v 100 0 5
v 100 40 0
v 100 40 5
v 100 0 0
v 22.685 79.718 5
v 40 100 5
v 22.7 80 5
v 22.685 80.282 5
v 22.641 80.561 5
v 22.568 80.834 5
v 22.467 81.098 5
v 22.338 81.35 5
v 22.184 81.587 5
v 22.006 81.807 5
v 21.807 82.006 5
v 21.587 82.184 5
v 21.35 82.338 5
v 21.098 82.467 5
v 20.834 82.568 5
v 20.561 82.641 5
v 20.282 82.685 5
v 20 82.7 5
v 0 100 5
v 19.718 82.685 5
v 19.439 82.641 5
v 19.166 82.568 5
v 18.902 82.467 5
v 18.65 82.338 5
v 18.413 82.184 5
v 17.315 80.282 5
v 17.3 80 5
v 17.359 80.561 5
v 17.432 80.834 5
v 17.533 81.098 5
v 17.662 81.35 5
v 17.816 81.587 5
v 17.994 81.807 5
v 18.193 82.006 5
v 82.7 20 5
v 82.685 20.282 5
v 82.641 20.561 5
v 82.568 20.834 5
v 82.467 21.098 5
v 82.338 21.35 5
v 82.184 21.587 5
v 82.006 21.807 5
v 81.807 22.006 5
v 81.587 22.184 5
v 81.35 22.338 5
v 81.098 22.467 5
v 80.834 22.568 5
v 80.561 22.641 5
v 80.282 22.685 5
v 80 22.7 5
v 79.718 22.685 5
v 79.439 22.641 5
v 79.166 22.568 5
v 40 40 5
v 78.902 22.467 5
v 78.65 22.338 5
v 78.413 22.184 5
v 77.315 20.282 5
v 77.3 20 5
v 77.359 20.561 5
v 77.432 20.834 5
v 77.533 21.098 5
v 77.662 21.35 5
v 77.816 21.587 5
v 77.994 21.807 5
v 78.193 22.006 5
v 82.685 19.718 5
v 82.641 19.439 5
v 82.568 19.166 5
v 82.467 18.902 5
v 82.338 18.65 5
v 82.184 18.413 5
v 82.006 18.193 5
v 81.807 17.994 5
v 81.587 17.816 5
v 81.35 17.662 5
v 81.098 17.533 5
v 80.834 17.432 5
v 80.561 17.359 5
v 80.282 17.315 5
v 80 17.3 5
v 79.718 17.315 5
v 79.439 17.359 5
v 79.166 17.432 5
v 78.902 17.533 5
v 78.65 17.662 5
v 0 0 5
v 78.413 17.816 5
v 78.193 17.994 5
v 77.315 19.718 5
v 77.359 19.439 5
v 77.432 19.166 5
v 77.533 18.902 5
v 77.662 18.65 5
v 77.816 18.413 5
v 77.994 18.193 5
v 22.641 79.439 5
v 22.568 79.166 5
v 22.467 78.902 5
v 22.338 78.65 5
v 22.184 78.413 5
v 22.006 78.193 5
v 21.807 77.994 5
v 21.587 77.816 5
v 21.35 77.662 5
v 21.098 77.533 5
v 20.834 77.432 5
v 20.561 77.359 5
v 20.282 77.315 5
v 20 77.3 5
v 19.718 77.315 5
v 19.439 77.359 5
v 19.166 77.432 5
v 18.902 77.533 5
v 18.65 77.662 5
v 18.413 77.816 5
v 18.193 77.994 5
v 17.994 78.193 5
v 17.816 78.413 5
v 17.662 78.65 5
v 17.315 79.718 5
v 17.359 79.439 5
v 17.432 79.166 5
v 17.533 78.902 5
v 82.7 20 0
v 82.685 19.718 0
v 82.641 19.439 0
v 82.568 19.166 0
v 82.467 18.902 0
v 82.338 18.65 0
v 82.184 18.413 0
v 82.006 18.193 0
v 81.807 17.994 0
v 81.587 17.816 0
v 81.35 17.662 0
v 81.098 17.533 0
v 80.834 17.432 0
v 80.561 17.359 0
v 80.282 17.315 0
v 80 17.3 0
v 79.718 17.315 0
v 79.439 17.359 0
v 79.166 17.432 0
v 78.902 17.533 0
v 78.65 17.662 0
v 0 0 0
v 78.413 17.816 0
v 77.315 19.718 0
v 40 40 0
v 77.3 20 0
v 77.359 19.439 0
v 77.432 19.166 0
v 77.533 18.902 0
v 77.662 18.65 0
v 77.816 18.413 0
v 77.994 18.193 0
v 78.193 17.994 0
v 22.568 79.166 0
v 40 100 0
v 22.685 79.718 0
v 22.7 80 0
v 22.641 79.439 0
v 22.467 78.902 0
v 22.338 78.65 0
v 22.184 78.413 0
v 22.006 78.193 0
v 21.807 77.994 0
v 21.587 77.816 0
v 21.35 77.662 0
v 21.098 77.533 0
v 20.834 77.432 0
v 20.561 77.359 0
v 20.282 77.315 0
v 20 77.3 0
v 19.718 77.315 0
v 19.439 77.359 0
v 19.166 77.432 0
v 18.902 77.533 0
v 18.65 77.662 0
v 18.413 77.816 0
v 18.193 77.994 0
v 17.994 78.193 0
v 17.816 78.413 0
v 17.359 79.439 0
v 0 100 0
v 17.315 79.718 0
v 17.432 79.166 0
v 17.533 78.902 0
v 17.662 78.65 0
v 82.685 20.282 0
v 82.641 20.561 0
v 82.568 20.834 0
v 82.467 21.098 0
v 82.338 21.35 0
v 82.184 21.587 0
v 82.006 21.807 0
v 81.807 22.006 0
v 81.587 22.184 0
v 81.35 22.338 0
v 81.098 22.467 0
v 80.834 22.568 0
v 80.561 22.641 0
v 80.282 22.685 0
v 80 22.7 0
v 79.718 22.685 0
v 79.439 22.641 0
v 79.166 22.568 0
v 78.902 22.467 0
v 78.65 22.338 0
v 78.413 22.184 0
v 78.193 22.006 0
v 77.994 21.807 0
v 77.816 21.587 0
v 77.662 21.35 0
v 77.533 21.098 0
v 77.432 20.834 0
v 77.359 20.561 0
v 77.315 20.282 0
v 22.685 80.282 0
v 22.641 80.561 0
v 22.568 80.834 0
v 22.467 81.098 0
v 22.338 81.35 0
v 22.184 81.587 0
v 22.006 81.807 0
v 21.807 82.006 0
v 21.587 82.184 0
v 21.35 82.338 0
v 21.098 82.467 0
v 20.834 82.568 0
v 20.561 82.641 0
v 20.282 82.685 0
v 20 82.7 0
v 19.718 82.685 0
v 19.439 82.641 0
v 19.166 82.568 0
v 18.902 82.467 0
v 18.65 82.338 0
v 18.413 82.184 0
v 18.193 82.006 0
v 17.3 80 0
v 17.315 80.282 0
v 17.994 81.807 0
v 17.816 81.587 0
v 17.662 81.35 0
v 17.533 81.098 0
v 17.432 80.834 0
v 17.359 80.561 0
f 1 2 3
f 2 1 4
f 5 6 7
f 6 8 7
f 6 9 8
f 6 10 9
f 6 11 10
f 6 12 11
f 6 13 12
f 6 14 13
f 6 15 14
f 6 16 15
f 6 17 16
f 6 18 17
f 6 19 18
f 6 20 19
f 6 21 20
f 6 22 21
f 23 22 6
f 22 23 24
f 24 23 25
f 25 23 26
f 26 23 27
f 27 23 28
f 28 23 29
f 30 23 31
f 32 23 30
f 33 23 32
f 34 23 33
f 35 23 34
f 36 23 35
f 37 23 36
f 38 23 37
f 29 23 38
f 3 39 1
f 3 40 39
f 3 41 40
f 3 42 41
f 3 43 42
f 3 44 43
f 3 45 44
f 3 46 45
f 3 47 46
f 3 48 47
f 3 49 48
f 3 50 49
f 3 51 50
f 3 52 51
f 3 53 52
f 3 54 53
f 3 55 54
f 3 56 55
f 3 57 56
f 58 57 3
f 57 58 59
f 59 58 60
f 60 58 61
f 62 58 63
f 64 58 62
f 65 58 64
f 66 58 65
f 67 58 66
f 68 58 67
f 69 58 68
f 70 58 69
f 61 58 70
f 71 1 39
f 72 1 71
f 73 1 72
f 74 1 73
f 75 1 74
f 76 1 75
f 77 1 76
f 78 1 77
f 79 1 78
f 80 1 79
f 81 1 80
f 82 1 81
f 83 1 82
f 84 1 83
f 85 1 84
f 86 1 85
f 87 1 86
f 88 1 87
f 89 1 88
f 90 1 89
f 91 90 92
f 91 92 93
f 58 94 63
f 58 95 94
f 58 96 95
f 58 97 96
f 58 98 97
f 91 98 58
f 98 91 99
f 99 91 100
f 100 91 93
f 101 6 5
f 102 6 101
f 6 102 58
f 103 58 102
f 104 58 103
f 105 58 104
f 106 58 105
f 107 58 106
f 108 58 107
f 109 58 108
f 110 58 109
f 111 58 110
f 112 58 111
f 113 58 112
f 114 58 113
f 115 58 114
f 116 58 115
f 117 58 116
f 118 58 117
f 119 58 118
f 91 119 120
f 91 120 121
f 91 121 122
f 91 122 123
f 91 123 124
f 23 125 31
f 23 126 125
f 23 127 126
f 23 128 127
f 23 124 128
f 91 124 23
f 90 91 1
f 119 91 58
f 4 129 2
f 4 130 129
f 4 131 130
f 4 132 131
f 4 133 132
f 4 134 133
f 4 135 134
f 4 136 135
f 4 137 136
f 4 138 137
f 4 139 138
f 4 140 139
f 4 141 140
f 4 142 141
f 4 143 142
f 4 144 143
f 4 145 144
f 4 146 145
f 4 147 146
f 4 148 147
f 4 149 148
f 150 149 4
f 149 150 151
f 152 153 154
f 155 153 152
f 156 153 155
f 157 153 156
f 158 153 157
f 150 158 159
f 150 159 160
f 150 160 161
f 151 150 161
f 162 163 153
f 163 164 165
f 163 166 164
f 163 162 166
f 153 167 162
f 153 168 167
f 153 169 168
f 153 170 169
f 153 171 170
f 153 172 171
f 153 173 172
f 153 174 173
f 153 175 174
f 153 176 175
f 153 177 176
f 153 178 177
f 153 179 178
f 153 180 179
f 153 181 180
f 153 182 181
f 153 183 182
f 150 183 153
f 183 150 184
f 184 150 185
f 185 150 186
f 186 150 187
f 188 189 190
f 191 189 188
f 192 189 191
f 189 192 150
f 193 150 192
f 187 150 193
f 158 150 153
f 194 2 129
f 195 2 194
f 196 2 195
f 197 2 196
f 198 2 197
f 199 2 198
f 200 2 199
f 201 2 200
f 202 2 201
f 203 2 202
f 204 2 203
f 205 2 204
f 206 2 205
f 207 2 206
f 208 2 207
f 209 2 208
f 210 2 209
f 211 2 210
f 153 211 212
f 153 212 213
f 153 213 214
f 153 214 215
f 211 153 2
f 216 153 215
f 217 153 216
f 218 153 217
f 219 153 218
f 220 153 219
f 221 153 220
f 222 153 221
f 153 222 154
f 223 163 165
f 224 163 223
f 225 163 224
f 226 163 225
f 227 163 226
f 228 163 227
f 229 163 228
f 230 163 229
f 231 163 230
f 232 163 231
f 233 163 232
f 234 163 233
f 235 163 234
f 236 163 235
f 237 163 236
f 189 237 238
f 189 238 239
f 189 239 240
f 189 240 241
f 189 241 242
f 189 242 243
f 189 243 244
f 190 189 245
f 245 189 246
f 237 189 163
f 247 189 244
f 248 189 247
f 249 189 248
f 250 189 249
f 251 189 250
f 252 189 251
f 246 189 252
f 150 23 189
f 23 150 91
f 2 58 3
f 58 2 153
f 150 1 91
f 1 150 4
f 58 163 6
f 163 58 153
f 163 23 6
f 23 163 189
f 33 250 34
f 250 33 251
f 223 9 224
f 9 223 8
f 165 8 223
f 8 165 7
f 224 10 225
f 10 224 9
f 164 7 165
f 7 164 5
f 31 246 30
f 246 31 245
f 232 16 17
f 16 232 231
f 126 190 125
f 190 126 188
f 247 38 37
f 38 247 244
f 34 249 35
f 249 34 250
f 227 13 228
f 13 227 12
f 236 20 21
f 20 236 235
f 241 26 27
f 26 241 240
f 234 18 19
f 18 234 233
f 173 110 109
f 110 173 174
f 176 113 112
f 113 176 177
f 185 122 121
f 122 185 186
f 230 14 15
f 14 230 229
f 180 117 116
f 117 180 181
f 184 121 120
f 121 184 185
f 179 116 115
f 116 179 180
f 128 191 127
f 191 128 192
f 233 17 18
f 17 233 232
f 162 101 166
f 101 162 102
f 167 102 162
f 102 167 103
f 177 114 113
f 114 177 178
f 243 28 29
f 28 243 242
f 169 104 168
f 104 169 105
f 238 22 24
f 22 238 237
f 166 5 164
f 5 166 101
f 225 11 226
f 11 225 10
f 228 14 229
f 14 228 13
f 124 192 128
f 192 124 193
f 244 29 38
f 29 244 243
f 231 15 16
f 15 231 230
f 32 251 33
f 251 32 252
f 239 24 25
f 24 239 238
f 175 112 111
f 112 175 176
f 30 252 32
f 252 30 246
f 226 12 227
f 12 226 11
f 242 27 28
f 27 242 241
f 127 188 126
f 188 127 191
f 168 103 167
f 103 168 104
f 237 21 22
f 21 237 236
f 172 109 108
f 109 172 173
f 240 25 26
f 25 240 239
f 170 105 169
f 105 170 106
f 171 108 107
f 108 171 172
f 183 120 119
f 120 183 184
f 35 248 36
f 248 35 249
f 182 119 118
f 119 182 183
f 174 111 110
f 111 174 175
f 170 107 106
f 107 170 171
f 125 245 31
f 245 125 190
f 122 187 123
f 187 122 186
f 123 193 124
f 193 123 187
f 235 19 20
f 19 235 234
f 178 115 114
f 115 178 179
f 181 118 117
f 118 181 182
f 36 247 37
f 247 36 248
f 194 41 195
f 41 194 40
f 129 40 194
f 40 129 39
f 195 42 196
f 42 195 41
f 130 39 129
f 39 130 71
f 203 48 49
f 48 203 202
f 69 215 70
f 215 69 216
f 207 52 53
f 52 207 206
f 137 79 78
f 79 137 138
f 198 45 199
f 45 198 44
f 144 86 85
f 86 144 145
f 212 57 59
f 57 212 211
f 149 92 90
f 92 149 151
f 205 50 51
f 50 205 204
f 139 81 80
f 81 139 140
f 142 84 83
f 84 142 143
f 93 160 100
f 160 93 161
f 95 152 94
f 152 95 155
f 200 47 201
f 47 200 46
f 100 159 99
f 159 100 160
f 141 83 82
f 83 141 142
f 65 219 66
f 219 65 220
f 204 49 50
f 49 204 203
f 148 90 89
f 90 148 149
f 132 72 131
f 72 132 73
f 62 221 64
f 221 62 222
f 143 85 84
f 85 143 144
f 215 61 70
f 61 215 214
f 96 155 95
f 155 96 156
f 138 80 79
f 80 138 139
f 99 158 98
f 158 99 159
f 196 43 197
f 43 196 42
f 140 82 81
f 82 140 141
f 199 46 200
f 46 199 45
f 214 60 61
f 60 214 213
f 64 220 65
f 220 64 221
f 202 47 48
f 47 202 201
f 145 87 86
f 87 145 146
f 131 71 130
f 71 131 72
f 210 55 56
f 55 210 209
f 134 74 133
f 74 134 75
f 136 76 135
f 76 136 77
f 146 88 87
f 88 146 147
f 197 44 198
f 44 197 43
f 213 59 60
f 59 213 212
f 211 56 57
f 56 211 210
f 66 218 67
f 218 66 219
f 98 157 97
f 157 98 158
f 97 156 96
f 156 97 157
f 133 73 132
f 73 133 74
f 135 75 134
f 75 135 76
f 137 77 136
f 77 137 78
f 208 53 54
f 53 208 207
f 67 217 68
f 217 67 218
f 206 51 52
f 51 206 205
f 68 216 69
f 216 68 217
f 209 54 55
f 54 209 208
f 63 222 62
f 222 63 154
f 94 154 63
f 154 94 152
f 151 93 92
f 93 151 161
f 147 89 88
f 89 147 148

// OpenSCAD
// Flat 90-degree corner plate.
$fn = 60;
eps = 0.02;
arm = 100;
width = 40;
plate_t = 5;
difference() {
    union() { cube([arm, width, plate_t]); cube([width, arm, plate_t]); }
    for (p = [[width / 2, arm - width / 2], [arm - width / 2, width / 2]])
        translate([p[0], p[1], -eps]) cylinder(d = 5.4, h = plate_t + 2 * eps);
}
